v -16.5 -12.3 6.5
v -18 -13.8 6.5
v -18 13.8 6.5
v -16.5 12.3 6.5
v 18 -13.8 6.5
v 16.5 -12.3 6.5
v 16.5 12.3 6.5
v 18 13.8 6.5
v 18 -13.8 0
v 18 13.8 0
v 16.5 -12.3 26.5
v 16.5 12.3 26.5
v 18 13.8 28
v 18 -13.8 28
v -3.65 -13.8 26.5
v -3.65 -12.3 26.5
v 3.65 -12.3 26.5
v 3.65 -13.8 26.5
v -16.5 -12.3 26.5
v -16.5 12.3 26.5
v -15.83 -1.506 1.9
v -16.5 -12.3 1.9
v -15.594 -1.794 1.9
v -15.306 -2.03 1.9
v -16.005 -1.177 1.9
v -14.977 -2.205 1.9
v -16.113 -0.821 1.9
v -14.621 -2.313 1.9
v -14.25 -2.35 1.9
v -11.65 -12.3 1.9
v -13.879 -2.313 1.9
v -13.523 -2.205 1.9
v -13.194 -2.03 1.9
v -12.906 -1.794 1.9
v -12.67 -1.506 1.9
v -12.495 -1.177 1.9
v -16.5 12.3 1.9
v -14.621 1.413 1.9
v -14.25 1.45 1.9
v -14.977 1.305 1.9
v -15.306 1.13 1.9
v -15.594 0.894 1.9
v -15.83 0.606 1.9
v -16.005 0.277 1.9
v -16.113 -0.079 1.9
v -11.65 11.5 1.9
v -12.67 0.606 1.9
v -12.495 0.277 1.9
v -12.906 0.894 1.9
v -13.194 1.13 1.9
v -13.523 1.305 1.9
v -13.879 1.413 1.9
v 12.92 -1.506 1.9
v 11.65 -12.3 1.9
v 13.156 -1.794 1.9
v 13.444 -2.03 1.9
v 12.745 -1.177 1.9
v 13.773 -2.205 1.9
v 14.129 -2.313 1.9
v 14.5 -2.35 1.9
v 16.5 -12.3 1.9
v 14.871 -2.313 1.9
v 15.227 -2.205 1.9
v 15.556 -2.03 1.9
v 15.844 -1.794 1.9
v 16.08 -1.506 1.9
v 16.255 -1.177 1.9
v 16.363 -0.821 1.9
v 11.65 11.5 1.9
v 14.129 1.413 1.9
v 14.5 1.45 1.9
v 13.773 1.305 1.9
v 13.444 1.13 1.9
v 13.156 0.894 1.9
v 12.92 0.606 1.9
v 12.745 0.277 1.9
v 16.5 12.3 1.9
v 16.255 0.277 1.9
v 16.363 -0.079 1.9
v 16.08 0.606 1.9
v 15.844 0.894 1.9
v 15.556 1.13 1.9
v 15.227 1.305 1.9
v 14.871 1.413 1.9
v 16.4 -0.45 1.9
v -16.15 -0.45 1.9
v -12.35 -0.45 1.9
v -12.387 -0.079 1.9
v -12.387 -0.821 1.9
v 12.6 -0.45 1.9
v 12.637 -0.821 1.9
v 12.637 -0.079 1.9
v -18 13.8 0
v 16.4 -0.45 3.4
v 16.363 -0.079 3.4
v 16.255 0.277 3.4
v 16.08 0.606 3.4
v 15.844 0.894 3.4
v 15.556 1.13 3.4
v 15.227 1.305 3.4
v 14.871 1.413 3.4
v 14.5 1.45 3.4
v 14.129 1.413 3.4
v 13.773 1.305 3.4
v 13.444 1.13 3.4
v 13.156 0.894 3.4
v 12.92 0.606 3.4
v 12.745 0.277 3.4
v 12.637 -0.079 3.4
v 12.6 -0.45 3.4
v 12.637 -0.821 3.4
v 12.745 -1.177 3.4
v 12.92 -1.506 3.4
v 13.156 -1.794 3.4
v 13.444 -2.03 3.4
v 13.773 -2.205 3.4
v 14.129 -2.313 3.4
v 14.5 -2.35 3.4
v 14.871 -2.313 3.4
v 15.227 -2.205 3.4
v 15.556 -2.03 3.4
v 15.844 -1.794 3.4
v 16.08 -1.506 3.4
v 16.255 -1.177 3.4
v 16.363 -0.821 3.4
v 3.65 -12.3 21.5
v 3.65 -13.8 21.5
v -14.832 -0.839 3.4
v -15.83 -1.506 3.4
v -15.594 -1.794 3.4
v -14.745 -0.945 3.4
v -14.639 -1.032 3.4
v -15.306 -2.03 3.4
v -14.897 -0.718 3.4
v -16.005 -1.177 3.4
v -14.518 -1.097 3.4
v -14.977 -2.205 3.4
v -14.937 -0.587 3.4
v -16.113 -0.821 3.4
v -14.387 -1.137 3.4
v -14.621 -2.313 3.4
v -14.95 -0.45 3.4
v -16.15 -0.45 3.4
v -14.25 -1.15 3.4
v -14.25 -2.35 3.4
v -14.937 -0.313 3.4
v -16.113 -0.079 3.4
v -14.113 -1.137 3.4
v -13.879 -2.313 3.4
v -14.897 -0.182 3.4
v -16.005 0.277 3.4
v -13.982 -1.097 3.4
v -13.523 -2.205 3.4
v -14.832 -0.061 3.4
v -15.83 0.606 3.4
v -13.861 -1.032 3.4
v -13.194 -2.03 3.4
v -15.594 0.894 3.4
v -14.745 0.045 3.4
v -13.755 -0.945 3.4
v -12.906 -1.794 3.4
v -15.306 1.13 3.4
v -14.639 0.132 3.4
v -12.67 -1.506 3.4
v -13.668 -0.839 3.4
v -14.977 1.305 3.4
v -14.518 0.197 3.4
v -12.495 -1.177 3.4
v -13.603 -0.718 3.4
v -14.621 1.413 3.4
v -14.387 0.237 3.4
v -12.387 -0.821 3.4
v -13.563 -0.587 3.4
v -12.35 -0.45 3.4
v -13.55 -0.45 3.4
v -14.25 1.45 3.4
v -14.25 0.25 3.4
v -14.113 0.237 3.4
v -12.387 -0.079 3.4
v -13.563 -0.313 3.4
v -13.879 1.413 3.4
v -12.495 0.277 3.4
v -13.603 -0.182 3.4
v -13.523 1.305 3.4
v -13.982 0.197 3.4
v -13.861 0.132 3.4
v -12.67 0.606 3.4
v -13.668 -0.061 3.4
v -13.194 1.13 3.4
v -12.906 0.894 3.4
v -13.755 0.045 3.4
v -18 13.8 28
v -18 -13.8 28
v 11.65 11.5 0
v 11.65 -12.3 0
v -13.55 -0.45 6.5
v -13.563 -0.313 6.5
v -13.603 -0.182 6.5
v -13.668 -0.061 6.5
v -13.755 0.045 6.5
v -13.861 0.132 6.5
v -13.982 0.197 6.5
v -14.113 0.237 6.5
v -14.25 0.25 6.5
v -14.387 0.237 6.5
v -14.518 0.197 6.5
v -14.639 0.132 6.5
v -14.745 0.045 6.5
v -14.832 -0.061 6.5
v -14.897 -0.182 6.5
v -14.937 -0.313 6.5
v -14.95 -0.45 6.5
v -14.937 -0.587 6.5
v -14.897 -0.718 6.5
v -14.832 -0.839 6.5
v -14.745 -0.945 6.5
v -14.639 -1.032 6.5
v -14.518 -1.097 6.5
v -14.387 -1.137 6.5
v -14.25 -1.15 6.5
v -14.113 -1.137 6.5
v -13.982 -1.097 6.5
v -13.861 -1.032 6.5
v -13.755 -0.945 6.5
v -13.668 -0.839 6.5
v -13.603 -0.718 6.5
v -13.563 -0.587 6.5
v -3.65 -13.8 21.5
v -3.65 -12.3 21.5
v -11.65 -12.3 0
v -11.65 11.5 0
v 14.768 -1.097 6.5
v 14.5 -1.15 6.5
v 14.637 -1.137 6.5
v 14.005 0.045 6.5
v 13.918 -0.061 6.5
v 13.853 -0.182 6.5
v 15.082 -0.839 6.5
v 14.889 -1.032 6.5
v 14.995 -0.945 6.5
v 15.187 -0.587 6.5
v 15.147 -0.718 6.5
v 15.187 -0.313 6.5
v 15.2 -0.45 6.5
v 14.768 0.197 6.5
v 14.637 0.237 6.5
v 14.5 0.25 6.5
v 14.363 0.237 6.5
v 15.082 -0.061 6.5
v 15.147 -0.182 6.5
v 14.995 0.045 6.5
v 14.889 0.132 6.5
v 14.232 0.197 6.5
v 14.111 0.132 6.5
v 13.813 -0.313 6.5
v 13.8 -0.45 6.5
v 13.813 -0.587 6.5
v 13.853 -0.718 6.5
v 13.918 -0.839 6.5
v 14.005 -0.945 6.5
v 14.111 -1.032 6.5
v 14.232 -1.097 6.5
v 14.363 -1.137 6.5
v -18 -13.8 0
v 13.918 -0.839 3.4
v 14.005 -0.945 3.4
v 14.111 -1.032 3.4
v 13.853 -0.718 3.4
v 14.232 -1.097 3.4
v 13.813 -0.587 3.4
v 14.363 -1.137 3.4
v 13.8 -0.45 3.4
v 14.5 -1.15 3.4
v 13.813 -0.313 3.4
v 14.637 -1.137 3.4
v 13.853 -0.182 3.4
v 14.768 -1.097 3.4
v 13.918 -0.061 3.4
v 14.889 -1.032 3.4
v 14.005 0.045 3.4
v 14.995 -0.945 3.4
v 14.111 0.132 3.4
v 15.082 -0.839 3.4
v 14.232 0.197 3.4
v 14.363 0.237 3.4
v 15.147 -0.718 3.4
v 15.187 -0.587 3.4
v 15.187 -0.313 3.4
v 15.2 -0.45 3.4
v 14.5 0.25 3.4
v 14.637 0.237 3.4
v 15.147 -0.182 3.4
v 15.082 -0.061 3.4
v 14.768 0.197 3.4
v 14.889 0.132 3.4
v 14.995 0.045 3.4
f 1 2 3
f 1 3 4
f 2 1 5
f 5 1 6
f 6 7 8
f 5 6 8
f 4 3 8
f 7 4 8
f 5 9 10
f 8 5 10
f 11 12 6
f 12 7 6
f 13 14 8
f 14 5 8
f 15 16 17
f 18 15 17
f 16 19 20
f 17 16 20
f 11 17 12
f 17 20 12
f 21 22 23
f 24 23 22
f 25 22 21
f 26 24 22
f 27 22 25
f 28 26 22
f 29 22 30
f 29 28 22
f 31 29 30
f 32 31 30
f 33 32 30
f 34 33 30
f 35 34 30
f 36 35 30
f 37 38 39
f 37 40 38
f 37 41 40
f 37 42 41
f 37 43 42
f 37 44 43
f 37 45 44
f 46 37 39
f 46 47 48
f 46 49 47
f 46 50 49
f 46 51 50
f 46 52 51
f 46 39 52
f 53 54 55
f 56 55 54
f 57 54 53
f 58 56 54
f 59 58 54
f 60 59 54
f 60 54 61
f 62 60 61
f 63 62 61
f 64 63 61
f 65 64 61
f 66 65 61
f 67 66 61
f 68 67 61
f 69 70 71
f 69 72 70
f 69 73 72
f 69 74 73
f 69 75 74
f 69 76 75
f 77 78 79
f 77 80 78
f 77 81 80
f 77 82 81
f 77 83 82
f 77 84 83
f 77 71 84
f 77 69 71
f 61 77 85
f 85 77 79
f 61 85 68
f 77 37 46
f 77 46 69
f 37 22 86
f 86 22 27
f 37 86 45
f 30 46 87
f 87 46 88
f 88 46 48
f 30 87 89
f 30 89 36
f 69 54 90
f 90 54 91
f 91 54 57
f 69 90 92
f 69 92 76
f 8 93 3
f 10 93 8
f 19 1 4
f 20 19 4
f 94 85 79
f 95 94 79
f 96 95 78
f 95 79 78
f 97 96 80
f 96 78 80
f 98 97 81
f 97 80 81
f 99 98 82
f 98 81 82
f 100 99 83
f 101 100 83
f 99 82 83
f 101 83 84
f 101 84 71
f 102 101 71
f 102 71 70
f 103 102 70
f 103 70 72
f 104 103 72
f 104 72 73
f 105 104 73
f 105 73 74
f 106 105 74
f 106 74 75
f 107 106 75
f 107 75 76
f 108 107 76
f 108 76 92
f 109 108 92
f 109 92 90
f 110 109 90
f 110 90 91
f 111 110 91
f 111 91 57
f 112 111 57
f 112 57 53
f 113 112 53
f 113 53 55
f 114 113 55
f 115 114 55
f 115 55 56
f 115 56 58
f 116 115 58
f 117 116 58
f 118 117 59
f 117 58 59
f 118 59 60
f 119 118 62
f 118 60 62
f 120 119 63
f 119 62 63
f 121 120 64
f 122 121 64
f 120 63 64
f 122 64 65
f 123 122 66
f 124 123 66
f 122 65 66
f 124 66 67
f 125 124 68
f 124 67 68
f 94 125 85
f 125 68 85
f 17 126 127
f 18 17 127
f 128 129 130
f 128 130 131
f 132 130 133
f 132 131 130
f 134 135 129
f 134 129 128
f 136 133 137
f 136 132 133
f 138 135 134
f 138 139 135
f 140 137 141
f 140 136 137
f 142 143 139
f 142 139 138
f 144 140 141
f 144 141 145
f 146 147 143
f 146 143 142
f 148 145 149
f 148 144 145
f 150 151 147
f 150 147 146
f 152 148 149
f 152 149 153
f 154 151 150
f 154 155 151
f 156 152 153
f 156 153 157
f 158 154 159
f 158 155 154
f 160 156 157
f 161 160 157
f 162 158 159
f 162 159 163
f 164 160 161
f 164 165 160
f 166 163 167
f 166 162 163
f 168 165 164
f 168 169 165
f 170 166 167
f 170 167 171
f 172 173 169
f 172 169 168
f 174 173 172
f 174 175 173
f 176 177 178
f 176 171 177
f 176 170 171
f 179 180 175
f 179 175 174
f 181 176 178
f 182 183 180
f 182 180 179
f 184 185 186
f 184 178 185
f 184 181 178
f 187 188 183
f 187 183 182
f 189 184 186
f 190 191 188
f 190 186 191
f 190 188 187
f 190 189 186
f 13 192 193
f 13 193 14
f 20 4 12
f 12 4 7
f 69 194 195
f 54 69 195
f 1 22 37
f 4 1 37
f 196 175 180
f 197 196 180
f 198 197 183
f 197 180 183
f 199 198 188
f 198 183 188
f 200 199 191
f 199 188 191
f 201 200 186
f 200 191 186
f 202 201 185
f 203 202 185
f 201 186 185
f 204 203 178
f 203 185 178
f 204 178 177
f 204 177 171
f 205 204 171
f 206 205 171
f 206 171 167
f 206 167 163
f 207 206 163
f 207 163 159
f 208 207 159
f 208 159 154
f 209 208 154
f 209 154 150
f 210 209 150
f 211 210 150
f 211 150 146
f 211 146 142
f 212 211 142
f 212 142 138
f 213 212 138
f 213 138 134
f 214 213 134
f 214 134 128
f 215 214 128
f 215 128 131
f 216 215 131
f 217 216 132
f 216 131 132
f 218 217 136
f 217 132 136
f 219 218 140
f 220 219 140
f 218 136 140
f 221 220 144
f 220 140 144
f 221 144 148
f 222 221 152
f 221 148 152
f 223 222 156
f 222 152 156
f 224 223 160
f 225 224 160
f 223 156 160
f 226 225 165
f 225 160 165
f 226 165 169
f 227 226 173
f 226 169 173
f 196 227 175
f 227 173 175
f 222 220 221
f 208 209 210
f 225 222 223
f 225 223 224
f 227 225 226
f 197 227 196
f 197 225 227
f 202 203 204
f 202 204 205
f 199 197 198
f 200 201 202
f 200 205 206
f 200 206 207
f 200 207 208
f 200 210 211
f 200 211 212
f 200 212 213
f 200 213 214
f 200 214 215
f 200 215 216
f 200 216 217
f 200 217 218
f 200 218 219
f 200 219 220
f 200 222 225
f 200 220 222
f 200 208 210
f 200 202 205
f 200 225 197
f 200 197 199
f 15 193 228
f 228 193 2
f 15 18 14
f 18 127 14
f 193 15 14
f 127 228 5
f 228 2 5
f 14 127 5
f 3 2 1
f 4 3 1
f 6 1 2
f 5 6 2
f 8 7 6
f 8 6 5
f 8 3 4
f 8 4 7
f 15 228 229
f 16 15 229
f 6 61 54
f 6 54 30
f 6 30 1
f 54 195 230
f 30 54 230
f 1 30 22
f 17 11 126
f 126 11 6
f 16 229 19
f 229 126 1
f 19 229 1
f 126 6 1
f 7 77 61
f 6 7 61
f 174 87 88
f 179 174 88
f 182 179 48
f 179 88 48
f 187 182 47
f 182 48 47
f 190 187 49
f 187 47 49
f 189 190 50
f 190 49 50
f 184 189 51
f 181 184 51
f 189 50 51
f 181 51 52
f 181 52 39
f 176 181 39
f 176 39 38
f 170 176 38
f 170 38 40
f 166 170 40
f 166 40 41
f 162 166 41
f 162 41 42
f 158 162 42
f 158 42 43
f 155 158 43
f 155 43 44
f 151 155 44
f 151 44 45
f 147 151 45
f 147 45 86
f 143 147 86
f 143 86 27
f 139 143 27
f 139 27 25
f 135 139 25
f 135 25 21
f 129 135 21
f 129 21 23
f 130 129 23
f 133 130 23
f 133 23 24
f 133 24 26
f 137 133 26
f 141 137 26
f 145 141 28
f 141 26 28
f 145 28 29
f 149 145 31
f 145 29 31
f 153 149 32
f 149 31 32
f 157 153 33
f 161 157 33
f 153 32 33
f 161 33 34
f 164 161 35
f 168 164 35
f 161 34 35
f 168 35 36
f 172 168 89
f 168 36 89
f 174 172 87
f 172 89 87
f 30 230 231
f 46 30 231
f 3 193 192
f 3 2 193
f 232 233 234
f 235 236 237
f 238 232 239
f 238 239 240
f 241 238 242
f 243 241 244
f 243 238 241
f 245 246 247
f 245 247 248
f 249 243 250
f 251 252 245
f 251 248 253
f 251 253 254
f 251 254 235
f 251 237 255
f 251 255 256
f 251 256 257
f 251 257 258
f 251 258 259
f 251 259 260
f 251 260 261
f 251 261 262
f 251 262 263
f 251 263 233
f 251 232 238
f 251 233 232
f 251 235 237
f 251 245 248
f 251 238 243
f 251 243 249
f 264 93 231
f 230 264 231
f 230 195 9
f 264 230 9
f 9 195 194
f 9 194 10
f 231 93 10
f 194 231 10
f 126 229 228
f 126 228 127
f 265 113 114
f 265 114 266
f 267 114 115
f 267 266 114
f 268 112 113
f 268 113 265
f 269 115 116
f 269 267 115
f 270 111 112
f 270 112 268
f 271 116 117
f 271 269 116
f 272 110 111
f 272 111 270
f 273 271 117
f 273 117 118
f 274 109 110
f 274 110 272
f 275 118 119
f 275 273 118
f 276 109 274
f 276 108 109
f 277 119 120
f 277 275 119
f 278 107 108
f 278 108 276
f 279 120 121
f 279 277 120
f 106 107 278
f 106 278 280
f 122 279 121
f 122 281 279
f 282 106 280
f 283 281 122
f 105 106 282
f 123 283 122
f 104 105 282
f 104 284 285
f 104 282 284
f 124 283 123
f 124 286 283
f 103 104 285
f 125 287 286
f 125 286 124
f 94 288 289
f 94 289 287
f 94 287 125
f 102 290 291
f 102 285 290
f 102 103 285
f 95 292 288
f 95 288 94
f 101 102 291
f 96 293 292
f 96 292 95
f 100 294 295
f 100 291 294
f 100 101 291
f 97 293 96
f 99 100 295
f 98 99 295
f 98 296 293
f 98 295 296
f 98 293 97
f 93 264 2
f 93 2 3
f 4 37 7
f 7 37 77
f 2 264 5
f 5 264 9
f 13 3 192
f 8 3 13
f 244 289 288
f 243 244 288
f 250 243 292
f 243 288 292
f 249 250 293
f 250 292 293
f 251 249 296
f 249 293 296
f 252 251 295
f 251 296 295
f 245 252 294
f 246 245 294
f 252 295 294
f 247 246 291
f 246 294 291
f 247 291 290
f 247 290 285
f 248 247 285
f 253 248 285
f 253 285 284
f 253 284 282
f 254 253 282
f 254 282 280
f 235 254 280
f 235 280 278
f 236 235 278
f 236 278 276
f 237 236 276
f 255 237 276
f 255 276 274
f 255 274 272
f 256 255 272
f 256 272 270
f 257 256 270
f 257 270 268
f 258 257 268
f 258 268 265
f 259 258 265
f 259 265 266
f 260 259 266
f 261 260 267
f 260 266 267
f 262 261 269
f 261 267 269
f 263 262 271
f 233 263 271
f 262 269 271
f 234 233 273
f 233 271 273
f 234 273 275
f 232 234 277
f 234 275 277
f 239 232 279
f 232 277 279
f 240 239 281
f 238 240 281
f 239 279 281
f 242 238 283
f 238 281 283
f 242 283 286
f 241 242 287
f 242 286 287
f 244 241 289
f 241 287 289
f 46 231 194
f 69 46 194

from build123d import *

# Parameters (mm, degrees)
F0_R      = 1.9
F1_DEPTH  = 1.9
F0_W      = 36
F0_H      = 27.6
F2_DEPTH  = 6.5
F0_R_2    = 0.7
F3_DEPTH  = 3.4
F4_DEPTH  = 6.5
F5_W      = 36
F5_H      = 27.6
F5_W_2    = 33
F5_H_2    = 24.6
F6_DEPTH  = 15
F8_DEPTH  = 5
F9_W      = 36
F9_H      = 27.6
F10_DEPTH = 1.5


with BuildPart() as f1:
    # F0 (on Top) → F1 (new body)
    with BuildSketch(Plane.XY):
        Polygon((16.5, -12.3), (16.5, 12.3), (-16.5, 12.3), (-16.5, -12.3), (-11.65, -12.3), (-11.65, 11.5), (11.65, 11.5), (11.65, -12.3), align=None)
        with Locations((-14.25, -0.45)):
            Circle(F0_R, mode=Mode.SUBTRACT)
        with Locations((14.5, -0.45)):
            Circle(F0_R, mode=Mode.SUBTRACT)
    extrude(amount=F1_DEPTH)

    # F0 (on Top) → F2 (join)
    with BuildSketch(Plane.XY):
        Rectangle(F0_W, F0_H)
        Polygon((-16.5, 12.3), (16.5, 12.3), (16.5, -12.3), (11.65, -12.3), (-11.65, -12.3), (-16.5, -12.3), align=None, mode=Mode.SUBTRACT)
    extrude(amount=F2_DEPTH)

    # F0 (on Top) → F3 (join)
    with BuildSketch(Plane.XY):
        with Locations((-14.25, -0.45)):
            Circle(F0_R)
        with Locations((-14.25, -0.45)):
            Circle(F0_R_2, mode=Mode.SUBTRACT)
        with Locations((14.5, -0.45)):
            Circle(F0_R)
        with Locations((14.5, -0.45)):
            Circle(F0_R_2, mode=Mode.SUBTRACT)
    extrude(amount=F3_DEPTH)

    # F0 (on Top) → F4 (join)
    with BuildSketch(Plane.XY):
        with Locations((-14.25, -0.45)):
            Circle(F0_R_2)
        with Locations((14.5, -0.45)):
            Circle(F0_R_2)
    extrude(amount=F4_DEPTH)


with BuildPart() as f6:
    # F5 (on face) → F6 (new body)
    with BuildSketch(Plane.XY.offset(6.5)):
        Rectangle(F5_W, F5_H)
        Rectangle(F5_W_2, F5_H_2, mode=Mode.SUBTRACT)
    extrude(amount=F6_DEPTH)

    # F7 (on face) → F8 (join)
    with BuildSketch(Plane.XY.offset(21.5)):
        Polygon((-16.5, -12.3), (-16.5, 12.3), (16.5, 12.3), (16.5, -12.3), (3.65, -12.3), (3.65, -13.8), (18, -13.8), (18, 13.8), (-18, 13.8), (-18, -13.8), (-3.65, -13.8), (-3.65, -12.3), align=None)
    extrude(amount=F8_DEPTH)

    # F9 (on face) → F10 (join)
    with BuildSketch(Plane.XY.offset(26.5)):
        Rectangle(F9_W, F9_H)
    extrude(amount=F10_DEPTH)


solid = Compound([f1.part, f6.part])
